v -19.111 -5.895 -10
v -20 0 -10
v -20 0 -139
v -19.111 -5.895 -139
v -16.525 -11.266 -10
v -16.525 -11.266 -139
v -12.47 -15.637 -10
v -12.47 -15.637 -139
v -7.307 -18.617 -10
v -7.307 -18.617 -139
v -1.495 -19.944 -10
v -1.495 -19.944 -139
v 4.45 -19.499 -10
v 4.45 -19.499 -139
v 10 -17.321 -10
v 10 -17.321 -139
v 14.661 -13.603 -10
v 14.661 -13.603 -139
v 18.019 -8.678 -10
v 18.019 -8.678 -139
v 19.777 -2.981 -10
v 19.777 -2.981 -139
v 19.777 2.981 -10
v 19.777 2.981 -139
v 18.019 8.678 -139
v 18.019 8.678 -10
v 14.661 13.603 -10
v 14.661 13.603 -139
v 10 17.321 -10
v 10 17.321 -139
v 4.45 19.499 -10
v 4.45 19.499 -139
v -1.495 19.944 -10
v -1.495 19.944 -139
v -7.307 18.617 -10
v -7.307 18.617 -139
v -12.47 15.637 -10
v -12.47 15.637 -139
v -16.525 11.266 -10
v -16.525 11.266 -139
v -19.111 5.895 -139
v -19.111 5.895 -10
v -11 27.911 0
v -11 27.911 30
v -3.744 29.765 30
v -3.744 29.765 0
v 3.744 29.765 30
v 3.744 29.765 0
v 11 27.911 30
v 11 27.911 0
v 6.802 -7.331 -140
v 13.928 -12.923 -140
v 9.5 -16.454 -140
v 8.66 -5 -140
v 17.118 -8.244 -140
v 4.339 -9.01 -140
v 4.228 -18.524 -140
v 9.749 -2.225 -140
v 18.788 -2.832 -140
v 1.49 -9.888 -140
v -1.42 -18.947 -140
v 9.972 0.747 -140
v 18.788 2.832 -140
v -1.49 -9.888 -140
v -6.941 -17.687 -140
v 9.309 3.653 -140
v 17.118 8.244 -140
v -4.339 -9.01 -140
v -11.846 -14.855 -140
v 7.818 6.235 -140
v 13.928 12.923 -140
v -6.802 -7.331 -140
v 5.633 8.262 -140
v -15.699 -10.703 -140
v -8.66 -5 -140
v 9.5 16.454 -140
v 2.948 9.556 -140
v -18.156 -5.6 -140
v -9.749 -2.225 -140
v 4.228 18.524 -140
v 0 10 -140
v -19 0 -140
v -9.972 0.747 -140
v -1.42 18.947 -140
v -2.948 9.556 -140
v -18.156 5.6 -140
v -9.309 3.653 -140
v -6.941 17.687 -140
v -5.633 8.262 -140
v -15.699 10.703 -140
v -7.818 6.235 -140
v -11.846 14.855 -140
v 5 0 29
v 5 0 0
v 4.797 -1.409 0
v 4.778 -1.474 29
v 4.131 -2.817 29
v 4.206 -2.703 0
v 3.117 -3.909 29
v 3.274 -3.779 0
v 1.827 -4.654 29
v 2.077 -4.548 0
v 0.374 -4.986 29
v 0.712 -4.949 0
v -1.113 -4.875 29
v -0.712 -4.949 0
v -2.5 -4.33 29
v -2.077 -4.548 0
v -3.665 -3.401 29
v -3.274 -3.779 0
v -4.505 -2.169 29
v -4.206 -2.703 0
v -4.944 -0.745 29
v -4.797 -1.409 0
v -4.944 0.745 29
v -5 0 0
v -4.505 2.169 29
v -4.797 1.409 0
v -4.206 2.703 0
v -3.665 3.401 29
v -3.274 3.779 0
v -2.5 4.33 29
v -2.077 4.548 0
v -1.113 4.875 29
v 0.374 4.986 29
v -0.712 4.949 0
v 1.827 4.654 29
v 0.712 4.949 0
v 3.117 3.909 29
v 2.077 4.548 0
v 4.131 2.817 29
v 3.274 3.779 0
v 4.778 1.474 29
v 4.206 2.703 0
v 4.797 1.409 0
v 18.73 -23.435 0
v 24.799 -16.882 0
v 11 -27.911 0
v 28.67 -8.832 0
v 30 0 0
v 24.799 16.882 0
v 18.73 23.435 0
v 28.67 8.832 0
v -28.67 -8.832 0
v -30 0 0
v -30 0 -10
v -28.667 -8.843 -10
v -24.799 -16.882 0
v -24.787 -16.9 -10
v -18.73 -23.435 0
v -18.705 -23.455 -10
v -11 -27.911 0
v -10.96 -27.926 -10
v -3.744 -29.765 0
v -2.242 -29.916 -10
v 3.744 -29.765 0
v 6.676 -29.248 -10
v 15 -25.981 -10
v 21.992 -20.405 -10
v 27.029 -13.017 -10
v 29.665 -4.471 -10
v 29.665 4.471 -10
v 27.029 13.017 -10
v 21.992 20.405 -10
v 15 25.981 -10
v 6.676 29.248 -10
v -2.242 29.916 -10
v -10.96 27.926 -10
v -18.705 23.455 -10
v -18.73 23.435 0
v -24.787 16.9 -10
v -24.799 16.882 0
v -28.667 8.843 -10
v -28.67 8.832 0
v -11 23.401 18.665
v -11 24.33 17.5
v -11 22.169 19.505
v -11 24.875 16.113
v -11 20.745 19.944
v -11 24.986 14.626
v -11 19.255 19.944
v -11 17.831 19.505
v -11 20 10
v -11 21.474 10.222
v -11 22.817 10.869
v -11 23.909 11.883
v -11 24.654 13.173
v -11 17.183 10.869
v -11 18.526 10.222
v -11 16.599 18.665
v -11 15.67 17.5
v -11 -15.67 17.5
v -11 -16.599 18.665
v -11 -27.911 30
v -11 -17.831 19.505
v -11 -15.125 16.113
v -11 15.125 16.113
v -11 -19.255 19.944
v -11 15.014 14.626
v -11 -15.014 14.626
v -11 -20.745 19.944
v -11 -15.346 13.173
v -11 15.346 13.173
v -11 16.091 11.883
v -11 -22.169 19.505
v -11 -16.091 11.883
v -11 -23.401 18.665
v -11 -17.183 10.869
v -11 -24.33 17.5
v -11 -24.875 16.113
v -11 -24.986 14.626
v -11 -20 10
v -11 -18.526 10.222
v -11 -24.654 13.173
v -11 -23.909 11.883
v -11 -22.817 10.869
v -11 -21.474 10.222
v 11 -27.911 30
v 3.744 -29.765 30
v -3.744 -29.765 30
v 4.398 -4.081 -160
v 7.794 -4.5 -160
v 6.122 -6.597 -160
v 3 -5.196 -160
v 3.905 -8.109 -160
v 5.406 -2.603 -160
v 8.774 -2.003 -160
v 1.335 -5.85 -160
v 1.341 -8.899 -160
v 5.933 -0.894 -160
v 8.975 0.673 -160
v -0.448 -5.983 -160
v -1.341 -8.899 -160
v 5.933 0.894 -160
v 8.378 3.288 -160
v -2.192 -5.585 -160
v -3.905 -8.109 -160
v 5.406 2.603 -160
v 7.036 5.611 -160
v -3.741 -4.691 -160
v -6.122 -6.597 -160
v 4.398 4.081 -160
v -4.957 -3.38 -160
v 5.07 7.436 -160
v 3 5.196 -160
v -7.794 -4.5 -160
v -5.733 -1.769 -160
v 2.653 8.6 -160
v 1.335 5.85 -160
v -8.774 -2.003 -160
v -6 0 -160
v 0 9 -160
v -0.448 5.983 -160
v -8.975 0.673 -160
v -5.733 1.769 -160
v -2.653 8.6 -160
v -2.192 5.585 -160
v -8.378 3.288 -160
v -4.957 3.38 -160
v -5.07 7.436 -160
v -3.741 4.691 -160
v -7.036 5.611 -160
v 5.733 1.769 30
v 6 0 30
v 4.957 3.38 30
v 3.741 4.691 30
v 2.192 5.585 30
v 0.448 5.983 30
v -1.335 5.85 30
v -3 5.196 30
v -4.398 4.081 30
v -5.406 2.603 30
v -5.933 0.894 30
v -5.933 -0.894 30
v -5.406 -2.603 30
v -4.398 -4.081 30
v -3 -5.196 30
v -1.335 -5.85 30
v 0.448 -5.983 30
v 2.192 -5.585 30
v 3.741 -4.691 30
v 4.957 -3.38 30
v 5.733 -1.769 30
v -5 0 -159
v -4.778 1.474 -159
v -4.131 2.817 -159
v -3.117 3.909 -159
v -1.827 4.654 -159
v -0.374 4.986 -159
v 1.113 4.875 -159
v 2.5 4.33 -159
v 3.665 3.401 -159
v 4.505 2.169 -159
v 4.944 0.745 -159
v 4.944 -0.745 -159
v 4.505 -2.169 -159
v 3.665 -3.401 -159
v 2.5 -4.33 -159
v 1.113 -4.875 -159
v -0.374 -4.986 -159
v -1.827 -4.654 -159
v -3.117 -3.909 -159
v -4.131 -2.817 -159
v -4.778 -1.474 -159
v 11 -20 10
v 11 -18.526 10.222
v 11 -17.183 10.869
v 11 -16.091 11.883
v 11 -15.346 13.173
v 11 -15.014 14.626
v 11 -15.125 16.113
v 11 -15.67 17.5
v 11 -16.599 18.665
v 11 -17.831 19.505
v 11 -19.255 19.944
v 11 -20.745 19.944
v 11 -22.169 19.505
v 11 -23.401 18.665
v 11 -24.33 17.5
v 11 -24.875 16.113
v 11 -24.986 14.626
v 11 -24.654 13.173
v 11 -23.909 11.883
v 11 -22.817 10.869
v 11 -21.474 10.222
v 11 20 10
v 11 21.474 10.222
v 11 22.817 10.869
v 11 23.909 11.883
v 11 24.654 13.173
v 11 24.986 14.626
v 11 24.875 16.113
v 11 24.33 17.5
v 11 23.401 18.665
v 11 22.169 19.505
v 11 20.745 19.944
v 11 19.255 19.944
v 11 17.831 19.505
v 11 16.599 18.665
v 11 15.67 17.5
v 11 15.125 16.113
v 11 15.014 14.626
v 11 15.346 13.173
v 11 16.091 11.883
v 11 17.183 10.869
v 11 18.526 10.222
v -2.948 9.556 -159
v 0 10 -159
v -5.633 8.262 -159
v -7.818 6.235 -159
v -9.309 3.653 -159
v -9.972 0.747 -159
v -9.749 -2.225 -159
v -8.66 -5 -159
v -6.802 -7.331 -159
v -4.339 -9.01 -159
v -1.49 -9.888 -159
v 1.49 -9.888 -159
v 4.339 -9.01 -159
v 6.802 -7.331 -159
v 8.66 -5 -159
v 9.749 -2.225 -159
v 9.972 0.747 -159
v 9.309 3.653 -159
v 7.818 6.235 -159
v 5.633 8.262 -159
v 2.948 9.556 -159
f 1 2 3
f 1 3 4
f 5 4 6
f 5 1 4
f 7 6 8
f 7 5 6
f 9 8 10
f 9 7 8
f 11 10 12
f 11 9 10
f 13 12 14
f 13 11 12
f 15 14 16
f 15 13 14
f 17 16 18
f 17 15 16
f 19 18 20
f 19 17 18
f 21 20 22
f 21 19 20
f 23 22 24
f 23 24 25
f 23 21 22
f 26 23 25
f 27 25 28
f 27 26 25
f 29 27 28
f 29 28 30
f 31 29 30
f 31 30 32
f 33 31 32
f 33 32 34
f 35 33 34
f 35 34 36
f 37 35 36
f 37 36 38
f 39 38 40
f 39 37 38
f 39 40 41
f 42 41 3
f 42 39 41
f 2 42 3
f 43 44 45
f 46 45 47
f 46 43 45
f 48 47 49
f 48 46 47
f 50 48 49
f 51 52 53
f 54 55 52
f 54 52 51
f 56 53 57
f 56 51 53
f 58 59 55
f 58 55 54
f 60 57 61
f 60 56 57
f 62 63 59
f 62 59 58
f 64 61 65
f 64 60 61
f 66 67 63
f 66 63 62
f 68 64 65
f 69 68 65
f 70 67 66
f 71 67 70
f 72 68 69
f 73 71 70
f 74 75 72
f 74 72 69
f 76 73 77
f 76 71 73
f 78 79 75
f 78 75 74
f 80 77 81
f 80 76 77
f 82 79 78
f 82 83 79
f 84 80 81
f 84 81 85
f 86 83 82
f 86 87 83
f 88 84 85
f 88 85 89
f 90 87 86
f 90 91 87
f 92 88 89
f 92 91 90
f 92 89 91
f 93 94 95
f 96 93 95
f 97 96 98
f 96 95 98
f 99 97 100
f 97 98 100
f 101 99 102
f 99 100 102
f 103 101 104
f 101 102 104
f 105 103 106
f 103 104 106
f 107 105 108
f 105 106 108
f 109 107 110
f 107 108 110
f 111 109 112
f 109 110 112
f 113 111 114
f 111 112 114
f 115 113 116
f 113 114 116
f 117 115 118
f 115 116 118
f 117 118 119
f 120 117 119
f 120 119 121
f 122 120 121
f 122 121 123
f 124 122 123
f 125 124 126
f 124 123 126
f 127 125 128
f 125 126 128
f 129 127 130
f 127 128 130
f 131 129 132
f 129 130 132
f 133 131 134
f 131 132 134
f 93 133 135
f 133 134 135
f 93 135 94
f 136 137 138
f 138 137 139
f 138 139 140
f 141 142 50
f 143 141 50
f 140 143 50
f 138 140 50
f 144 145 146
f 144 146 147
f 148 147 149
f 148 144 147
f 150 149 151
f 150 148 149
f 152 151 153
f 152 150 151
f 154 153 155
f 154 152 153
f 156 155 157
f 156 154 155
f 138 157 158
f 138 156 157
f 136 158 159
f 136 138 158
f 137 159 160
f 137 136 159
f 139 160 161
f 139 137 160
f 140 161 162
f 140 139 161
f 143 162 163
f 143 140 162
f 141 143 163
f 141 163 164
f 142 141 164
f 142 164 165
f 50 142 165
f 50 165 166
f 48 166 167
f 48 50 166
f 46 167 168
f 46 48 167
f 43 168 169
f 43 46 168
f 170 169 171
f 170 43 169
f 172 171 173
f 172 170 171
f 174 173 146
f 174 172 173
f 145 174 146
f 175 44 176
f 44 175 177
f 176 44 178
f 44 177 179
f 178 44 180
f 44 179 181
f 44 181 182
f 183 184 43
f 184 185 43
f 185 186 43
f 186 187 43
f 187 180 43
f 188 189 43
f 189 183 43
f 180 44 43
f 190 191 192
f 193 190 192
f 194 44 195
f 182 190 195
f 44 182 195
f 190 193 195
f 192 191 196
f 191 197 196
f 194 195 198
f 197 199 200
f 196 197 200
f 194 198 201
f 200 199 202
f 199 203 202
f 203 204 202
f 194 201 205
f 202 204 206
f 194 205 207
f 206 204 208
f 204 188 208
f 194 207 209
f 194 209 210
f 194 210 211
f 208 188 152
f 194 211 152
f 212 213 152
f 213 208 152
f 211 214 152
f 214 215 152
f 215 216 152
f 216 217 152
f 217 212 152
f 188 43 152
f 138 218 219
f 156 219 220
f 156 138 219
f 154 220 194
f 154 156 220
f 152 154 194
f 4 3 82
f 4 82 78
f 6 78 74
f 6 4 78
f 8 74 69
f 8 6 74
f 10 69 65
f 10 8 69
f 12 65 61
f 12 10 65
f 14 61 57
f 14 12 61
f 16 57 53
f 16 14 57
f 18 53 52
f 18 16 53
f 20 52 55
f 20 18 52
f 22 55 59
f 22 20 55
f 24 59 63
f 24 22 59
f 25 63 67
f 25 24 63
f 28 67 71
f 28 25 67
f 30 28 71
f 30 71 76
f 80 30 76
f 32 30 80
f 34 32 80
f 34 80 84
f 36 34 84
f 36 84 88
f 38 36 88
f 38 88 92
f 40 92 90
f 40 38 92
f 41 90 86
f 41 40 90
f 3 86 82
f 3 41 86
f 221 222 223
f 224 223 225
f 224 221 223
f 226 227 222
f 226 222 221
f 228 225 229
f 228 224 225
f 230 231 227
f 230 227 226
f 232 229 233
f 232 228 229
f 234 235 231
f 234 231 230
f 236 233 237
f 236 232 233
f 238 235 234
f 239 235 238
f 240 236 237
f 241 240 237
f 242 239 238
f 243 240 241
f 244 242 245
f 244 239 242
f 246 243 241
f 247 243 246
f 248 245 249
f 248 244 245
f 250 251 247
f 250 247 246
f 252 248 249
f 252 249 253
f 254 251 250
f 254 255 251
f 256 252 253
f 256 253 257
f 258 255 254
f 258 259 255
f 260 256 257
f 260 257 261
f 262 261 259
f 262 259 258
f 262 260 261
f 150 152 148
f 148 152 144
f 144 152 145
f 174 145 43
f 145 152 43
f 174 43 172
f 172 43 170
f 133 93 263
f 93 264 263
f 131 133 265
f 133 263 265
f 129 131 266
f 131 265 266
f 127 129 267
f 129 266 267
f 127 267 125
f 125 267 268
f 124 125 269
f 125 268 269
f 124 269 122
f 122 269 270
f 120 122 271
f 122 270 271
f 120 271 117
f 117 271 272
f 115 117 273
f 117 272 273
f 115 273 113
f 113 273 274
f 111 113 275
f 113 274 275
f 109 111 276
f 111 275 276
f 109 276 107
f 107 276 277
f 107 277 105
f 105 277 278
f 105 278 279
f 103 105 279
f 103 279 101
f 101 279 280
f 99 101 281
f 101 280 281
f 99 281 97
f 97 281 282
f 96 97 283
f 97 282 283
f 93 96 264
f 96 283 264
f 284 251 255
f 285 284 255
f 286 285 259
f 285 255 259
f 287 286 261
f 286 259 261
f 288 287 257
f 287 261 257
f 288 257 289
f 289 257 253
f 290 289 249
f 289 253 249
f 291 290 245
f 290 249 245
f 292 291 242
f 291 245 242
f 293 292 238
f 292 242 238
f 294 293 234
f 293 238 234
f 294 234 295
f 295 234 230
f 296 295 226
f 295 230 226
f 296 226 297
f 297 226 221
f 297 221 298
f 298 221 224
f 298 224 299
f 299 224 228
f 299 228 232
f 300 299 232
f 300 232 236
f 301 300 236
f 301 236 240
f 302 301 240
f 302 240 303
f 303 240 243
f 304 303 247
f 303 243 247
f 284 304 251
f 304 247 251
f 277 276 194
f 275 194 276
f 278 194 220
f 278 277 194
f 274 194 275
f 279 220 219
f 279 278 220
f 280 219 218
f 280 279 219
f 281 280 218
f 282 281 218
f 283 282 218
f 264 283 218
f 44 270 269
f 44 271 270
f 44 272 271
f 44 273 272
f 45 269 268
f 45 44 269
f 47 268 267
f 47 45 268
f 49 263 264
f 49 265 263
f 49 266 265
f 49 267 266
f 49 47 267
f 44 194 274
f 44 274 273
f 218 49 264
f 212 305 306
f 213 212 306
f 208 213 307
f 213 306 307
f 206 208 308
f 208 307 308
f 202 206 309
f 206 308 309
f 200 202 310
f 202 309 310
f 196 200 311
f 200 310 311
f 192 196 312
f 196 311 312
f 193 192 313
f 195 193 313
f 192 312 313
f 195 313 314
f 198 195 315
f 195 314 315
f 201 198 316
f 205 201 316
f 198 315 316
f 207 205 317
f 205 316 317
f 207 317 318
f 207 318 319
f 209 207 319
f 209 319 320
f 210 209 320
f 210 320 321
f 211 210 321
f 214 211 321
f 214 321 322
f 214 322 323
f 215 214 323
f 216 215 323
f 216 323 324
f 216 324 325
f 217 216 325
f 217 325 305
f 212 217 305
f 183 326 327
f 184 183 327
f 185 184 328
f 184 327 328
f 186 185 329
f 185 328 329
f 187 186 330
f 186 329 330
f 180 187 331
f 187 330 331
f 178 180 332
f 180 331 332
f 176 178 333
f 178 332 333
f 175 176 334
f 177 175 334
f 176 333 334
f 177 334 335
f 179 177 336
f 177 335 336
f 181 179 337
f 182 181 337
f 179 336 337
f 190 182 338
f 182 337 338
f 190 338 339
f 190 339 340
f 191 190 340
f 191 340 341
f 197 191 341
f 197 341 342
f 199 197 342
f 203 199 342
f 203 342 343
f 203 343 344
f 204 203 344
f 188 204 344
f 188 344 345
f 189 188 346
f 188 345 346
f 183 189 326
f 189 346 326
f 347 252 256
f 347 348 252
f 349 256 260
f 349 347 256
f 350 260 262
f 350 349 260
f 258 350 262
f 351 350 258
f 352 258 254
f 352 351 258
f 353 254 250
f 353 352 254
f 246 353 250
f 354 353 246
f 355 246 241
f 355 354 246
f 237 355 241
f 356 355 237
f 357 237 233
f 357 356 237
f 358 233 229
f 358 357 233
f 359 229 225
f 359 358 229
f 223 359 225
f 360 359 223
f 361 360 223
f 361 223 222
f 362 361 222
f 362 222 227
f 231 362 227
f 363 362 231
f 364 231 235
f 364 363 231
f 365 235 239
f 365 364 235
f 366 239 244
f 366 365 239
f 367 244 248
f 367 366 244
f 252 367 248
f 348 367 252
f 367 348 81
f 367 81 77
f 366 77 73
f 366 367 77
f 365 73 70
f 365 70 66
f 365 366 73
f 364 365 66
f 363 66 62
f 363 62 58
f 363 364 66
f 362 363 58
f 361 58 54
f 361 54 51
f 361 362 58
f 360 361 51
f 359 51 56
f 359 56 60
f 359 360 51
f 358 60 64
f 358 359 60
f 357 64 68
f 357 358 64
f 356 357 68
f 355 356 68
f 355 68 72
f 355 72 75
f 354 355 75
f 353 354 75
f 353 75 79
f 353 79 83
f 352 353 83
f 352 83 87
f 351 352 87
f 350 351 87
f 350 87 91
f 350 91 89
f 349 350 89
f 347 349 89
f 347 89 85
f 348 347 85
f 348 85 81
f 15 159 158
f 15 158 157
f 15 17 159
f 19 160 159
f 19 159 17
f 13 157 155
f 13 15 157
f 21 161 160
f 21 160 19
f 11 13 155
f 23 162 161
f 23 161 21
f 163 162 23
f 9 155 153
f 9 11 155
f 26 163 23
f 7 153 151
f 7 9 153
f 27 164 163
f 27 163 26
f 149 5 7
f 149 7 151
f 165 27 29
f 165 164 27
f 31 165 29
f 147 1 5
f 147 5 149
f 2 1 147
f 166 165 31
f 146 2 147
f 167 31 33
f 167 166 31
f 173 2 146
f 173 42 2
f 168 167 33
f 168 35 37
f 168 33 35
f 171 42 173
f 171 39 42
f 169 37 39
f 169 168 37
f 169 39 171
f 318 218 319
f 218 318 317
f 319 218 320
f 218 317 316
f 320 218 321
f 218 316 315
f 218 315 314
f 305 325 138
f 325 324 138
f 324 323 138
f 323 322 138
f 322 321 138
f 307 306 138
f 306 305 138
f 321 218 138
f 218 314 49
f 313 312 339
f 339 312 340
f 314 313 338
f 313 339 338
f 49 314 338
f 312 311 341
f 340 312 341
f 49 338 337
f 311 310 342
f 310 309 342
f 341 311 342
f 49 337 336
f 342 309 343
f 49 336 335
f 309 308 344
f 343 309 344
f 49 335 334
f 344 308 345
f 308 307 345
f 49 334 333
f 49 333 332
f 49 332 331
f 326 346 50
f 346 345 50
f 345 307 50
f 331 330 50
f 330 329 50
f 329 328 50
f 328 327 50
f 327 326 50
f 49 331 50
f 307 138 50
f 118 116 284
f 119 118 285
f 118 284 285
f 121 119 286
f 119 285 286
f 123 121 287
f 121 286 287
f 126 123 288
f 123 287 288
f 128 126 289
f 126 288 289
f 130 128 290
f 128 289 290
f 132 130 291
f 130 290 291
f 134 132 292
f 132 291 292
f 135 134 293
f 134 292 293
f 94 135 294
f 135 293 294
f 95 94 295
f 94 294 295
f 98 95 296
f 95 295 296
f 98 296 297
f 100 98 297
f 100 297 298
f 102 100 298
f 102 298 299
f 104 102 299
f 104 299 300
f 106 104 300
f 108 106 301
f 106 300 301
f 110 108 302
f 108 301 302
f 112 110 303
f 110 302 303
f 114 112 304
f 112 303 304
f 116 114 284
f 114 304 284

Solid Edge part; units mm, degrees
sketch "Sketch1" plane through (0, 0, 0) normal (0, -1, 0) x (1, 0, 0)
  line L0 (-30, 0) -> (-5, 0)
  line L1 (-5, 0) -> (-5, -160)
  line L2 (-5, -160) -> (-20, -160)
  line L3 (-20, -160) -> (-20, -10)
  line L4 (-20, -10) -> (-30, -10)
  line L5 (-30, -10) -> (-30, 0)
  dimension "D1" = 20
  dimension "D2" = 5
  dimension "D3" = 160
  dimension "D4" = 10
  dimension "D5" = 30
  dimension "D6" = 150
revolve "RevolvedProtrusion1" add sketch "Sketch1" angle 360 about axis through (0, 0, 54) along (0, 0, -1)
sketch "Sketch2" plane through (0, 0, -160) normal (0, 0, -1) x (0, 1, 0)
  circle A0 centre (0, 0) radius 10
  circle A1 centre (0, 0) radius 20
  dimension "D1" = 20
extrude "Cutout1" cut sketch "Sketch2" against normal blind 20
cosmetic_thread "Thread1" size "M20"
sketch "Sketch3" plane through (0, 0, 0) normal (0, 0, 1) x (1, 0, 0)
  circle A0 centre (0, 0) radius 30
  circle A1 centre (0, 0) radius 5
extrude "Ausprägung_1" add sketch "Sketch3" along normal blind 30
sketch "Sketch4" plane through (0, 0, 0) normal (0, 0, 1) x (1, 0, 0)
  line L0 (-61, 50) -> (-11, 50)
  line L1 (-11, 50) -> (-11, -50)
  line L2 (-11, -50) -> (-61, -50)
  line L3 (-61, -50) -> (-61, 50)
  dimension "D1" = 50
  dimension "D2" = 100
  dimension "D3" = 11
extrude "Cutout2" cut sketch "Sketch4" along normal up to next
mirror "Mirror1" about plane through (0, 0, 0) normal (1, 0, 0) of "Cutout2"
hole "Bohrung_1" at (11, -20, 15) direction (-1, 0, 0) diameter 10 end through all
hole "Hole1" at (11, 20, 15) direction (-1, 0, 0) diameter 10 end through all
extrude "Cutout4" [suppressed]
chamfer "Fase_2" distance 1 angle 45 2 edges at (0, -20, -140) (0, -10, -160)
chamfer "Fase_3" distance 1 angle 45 2 edges at (-5, 0, 30) (5, 0, -160)
properties material "Stahl"
